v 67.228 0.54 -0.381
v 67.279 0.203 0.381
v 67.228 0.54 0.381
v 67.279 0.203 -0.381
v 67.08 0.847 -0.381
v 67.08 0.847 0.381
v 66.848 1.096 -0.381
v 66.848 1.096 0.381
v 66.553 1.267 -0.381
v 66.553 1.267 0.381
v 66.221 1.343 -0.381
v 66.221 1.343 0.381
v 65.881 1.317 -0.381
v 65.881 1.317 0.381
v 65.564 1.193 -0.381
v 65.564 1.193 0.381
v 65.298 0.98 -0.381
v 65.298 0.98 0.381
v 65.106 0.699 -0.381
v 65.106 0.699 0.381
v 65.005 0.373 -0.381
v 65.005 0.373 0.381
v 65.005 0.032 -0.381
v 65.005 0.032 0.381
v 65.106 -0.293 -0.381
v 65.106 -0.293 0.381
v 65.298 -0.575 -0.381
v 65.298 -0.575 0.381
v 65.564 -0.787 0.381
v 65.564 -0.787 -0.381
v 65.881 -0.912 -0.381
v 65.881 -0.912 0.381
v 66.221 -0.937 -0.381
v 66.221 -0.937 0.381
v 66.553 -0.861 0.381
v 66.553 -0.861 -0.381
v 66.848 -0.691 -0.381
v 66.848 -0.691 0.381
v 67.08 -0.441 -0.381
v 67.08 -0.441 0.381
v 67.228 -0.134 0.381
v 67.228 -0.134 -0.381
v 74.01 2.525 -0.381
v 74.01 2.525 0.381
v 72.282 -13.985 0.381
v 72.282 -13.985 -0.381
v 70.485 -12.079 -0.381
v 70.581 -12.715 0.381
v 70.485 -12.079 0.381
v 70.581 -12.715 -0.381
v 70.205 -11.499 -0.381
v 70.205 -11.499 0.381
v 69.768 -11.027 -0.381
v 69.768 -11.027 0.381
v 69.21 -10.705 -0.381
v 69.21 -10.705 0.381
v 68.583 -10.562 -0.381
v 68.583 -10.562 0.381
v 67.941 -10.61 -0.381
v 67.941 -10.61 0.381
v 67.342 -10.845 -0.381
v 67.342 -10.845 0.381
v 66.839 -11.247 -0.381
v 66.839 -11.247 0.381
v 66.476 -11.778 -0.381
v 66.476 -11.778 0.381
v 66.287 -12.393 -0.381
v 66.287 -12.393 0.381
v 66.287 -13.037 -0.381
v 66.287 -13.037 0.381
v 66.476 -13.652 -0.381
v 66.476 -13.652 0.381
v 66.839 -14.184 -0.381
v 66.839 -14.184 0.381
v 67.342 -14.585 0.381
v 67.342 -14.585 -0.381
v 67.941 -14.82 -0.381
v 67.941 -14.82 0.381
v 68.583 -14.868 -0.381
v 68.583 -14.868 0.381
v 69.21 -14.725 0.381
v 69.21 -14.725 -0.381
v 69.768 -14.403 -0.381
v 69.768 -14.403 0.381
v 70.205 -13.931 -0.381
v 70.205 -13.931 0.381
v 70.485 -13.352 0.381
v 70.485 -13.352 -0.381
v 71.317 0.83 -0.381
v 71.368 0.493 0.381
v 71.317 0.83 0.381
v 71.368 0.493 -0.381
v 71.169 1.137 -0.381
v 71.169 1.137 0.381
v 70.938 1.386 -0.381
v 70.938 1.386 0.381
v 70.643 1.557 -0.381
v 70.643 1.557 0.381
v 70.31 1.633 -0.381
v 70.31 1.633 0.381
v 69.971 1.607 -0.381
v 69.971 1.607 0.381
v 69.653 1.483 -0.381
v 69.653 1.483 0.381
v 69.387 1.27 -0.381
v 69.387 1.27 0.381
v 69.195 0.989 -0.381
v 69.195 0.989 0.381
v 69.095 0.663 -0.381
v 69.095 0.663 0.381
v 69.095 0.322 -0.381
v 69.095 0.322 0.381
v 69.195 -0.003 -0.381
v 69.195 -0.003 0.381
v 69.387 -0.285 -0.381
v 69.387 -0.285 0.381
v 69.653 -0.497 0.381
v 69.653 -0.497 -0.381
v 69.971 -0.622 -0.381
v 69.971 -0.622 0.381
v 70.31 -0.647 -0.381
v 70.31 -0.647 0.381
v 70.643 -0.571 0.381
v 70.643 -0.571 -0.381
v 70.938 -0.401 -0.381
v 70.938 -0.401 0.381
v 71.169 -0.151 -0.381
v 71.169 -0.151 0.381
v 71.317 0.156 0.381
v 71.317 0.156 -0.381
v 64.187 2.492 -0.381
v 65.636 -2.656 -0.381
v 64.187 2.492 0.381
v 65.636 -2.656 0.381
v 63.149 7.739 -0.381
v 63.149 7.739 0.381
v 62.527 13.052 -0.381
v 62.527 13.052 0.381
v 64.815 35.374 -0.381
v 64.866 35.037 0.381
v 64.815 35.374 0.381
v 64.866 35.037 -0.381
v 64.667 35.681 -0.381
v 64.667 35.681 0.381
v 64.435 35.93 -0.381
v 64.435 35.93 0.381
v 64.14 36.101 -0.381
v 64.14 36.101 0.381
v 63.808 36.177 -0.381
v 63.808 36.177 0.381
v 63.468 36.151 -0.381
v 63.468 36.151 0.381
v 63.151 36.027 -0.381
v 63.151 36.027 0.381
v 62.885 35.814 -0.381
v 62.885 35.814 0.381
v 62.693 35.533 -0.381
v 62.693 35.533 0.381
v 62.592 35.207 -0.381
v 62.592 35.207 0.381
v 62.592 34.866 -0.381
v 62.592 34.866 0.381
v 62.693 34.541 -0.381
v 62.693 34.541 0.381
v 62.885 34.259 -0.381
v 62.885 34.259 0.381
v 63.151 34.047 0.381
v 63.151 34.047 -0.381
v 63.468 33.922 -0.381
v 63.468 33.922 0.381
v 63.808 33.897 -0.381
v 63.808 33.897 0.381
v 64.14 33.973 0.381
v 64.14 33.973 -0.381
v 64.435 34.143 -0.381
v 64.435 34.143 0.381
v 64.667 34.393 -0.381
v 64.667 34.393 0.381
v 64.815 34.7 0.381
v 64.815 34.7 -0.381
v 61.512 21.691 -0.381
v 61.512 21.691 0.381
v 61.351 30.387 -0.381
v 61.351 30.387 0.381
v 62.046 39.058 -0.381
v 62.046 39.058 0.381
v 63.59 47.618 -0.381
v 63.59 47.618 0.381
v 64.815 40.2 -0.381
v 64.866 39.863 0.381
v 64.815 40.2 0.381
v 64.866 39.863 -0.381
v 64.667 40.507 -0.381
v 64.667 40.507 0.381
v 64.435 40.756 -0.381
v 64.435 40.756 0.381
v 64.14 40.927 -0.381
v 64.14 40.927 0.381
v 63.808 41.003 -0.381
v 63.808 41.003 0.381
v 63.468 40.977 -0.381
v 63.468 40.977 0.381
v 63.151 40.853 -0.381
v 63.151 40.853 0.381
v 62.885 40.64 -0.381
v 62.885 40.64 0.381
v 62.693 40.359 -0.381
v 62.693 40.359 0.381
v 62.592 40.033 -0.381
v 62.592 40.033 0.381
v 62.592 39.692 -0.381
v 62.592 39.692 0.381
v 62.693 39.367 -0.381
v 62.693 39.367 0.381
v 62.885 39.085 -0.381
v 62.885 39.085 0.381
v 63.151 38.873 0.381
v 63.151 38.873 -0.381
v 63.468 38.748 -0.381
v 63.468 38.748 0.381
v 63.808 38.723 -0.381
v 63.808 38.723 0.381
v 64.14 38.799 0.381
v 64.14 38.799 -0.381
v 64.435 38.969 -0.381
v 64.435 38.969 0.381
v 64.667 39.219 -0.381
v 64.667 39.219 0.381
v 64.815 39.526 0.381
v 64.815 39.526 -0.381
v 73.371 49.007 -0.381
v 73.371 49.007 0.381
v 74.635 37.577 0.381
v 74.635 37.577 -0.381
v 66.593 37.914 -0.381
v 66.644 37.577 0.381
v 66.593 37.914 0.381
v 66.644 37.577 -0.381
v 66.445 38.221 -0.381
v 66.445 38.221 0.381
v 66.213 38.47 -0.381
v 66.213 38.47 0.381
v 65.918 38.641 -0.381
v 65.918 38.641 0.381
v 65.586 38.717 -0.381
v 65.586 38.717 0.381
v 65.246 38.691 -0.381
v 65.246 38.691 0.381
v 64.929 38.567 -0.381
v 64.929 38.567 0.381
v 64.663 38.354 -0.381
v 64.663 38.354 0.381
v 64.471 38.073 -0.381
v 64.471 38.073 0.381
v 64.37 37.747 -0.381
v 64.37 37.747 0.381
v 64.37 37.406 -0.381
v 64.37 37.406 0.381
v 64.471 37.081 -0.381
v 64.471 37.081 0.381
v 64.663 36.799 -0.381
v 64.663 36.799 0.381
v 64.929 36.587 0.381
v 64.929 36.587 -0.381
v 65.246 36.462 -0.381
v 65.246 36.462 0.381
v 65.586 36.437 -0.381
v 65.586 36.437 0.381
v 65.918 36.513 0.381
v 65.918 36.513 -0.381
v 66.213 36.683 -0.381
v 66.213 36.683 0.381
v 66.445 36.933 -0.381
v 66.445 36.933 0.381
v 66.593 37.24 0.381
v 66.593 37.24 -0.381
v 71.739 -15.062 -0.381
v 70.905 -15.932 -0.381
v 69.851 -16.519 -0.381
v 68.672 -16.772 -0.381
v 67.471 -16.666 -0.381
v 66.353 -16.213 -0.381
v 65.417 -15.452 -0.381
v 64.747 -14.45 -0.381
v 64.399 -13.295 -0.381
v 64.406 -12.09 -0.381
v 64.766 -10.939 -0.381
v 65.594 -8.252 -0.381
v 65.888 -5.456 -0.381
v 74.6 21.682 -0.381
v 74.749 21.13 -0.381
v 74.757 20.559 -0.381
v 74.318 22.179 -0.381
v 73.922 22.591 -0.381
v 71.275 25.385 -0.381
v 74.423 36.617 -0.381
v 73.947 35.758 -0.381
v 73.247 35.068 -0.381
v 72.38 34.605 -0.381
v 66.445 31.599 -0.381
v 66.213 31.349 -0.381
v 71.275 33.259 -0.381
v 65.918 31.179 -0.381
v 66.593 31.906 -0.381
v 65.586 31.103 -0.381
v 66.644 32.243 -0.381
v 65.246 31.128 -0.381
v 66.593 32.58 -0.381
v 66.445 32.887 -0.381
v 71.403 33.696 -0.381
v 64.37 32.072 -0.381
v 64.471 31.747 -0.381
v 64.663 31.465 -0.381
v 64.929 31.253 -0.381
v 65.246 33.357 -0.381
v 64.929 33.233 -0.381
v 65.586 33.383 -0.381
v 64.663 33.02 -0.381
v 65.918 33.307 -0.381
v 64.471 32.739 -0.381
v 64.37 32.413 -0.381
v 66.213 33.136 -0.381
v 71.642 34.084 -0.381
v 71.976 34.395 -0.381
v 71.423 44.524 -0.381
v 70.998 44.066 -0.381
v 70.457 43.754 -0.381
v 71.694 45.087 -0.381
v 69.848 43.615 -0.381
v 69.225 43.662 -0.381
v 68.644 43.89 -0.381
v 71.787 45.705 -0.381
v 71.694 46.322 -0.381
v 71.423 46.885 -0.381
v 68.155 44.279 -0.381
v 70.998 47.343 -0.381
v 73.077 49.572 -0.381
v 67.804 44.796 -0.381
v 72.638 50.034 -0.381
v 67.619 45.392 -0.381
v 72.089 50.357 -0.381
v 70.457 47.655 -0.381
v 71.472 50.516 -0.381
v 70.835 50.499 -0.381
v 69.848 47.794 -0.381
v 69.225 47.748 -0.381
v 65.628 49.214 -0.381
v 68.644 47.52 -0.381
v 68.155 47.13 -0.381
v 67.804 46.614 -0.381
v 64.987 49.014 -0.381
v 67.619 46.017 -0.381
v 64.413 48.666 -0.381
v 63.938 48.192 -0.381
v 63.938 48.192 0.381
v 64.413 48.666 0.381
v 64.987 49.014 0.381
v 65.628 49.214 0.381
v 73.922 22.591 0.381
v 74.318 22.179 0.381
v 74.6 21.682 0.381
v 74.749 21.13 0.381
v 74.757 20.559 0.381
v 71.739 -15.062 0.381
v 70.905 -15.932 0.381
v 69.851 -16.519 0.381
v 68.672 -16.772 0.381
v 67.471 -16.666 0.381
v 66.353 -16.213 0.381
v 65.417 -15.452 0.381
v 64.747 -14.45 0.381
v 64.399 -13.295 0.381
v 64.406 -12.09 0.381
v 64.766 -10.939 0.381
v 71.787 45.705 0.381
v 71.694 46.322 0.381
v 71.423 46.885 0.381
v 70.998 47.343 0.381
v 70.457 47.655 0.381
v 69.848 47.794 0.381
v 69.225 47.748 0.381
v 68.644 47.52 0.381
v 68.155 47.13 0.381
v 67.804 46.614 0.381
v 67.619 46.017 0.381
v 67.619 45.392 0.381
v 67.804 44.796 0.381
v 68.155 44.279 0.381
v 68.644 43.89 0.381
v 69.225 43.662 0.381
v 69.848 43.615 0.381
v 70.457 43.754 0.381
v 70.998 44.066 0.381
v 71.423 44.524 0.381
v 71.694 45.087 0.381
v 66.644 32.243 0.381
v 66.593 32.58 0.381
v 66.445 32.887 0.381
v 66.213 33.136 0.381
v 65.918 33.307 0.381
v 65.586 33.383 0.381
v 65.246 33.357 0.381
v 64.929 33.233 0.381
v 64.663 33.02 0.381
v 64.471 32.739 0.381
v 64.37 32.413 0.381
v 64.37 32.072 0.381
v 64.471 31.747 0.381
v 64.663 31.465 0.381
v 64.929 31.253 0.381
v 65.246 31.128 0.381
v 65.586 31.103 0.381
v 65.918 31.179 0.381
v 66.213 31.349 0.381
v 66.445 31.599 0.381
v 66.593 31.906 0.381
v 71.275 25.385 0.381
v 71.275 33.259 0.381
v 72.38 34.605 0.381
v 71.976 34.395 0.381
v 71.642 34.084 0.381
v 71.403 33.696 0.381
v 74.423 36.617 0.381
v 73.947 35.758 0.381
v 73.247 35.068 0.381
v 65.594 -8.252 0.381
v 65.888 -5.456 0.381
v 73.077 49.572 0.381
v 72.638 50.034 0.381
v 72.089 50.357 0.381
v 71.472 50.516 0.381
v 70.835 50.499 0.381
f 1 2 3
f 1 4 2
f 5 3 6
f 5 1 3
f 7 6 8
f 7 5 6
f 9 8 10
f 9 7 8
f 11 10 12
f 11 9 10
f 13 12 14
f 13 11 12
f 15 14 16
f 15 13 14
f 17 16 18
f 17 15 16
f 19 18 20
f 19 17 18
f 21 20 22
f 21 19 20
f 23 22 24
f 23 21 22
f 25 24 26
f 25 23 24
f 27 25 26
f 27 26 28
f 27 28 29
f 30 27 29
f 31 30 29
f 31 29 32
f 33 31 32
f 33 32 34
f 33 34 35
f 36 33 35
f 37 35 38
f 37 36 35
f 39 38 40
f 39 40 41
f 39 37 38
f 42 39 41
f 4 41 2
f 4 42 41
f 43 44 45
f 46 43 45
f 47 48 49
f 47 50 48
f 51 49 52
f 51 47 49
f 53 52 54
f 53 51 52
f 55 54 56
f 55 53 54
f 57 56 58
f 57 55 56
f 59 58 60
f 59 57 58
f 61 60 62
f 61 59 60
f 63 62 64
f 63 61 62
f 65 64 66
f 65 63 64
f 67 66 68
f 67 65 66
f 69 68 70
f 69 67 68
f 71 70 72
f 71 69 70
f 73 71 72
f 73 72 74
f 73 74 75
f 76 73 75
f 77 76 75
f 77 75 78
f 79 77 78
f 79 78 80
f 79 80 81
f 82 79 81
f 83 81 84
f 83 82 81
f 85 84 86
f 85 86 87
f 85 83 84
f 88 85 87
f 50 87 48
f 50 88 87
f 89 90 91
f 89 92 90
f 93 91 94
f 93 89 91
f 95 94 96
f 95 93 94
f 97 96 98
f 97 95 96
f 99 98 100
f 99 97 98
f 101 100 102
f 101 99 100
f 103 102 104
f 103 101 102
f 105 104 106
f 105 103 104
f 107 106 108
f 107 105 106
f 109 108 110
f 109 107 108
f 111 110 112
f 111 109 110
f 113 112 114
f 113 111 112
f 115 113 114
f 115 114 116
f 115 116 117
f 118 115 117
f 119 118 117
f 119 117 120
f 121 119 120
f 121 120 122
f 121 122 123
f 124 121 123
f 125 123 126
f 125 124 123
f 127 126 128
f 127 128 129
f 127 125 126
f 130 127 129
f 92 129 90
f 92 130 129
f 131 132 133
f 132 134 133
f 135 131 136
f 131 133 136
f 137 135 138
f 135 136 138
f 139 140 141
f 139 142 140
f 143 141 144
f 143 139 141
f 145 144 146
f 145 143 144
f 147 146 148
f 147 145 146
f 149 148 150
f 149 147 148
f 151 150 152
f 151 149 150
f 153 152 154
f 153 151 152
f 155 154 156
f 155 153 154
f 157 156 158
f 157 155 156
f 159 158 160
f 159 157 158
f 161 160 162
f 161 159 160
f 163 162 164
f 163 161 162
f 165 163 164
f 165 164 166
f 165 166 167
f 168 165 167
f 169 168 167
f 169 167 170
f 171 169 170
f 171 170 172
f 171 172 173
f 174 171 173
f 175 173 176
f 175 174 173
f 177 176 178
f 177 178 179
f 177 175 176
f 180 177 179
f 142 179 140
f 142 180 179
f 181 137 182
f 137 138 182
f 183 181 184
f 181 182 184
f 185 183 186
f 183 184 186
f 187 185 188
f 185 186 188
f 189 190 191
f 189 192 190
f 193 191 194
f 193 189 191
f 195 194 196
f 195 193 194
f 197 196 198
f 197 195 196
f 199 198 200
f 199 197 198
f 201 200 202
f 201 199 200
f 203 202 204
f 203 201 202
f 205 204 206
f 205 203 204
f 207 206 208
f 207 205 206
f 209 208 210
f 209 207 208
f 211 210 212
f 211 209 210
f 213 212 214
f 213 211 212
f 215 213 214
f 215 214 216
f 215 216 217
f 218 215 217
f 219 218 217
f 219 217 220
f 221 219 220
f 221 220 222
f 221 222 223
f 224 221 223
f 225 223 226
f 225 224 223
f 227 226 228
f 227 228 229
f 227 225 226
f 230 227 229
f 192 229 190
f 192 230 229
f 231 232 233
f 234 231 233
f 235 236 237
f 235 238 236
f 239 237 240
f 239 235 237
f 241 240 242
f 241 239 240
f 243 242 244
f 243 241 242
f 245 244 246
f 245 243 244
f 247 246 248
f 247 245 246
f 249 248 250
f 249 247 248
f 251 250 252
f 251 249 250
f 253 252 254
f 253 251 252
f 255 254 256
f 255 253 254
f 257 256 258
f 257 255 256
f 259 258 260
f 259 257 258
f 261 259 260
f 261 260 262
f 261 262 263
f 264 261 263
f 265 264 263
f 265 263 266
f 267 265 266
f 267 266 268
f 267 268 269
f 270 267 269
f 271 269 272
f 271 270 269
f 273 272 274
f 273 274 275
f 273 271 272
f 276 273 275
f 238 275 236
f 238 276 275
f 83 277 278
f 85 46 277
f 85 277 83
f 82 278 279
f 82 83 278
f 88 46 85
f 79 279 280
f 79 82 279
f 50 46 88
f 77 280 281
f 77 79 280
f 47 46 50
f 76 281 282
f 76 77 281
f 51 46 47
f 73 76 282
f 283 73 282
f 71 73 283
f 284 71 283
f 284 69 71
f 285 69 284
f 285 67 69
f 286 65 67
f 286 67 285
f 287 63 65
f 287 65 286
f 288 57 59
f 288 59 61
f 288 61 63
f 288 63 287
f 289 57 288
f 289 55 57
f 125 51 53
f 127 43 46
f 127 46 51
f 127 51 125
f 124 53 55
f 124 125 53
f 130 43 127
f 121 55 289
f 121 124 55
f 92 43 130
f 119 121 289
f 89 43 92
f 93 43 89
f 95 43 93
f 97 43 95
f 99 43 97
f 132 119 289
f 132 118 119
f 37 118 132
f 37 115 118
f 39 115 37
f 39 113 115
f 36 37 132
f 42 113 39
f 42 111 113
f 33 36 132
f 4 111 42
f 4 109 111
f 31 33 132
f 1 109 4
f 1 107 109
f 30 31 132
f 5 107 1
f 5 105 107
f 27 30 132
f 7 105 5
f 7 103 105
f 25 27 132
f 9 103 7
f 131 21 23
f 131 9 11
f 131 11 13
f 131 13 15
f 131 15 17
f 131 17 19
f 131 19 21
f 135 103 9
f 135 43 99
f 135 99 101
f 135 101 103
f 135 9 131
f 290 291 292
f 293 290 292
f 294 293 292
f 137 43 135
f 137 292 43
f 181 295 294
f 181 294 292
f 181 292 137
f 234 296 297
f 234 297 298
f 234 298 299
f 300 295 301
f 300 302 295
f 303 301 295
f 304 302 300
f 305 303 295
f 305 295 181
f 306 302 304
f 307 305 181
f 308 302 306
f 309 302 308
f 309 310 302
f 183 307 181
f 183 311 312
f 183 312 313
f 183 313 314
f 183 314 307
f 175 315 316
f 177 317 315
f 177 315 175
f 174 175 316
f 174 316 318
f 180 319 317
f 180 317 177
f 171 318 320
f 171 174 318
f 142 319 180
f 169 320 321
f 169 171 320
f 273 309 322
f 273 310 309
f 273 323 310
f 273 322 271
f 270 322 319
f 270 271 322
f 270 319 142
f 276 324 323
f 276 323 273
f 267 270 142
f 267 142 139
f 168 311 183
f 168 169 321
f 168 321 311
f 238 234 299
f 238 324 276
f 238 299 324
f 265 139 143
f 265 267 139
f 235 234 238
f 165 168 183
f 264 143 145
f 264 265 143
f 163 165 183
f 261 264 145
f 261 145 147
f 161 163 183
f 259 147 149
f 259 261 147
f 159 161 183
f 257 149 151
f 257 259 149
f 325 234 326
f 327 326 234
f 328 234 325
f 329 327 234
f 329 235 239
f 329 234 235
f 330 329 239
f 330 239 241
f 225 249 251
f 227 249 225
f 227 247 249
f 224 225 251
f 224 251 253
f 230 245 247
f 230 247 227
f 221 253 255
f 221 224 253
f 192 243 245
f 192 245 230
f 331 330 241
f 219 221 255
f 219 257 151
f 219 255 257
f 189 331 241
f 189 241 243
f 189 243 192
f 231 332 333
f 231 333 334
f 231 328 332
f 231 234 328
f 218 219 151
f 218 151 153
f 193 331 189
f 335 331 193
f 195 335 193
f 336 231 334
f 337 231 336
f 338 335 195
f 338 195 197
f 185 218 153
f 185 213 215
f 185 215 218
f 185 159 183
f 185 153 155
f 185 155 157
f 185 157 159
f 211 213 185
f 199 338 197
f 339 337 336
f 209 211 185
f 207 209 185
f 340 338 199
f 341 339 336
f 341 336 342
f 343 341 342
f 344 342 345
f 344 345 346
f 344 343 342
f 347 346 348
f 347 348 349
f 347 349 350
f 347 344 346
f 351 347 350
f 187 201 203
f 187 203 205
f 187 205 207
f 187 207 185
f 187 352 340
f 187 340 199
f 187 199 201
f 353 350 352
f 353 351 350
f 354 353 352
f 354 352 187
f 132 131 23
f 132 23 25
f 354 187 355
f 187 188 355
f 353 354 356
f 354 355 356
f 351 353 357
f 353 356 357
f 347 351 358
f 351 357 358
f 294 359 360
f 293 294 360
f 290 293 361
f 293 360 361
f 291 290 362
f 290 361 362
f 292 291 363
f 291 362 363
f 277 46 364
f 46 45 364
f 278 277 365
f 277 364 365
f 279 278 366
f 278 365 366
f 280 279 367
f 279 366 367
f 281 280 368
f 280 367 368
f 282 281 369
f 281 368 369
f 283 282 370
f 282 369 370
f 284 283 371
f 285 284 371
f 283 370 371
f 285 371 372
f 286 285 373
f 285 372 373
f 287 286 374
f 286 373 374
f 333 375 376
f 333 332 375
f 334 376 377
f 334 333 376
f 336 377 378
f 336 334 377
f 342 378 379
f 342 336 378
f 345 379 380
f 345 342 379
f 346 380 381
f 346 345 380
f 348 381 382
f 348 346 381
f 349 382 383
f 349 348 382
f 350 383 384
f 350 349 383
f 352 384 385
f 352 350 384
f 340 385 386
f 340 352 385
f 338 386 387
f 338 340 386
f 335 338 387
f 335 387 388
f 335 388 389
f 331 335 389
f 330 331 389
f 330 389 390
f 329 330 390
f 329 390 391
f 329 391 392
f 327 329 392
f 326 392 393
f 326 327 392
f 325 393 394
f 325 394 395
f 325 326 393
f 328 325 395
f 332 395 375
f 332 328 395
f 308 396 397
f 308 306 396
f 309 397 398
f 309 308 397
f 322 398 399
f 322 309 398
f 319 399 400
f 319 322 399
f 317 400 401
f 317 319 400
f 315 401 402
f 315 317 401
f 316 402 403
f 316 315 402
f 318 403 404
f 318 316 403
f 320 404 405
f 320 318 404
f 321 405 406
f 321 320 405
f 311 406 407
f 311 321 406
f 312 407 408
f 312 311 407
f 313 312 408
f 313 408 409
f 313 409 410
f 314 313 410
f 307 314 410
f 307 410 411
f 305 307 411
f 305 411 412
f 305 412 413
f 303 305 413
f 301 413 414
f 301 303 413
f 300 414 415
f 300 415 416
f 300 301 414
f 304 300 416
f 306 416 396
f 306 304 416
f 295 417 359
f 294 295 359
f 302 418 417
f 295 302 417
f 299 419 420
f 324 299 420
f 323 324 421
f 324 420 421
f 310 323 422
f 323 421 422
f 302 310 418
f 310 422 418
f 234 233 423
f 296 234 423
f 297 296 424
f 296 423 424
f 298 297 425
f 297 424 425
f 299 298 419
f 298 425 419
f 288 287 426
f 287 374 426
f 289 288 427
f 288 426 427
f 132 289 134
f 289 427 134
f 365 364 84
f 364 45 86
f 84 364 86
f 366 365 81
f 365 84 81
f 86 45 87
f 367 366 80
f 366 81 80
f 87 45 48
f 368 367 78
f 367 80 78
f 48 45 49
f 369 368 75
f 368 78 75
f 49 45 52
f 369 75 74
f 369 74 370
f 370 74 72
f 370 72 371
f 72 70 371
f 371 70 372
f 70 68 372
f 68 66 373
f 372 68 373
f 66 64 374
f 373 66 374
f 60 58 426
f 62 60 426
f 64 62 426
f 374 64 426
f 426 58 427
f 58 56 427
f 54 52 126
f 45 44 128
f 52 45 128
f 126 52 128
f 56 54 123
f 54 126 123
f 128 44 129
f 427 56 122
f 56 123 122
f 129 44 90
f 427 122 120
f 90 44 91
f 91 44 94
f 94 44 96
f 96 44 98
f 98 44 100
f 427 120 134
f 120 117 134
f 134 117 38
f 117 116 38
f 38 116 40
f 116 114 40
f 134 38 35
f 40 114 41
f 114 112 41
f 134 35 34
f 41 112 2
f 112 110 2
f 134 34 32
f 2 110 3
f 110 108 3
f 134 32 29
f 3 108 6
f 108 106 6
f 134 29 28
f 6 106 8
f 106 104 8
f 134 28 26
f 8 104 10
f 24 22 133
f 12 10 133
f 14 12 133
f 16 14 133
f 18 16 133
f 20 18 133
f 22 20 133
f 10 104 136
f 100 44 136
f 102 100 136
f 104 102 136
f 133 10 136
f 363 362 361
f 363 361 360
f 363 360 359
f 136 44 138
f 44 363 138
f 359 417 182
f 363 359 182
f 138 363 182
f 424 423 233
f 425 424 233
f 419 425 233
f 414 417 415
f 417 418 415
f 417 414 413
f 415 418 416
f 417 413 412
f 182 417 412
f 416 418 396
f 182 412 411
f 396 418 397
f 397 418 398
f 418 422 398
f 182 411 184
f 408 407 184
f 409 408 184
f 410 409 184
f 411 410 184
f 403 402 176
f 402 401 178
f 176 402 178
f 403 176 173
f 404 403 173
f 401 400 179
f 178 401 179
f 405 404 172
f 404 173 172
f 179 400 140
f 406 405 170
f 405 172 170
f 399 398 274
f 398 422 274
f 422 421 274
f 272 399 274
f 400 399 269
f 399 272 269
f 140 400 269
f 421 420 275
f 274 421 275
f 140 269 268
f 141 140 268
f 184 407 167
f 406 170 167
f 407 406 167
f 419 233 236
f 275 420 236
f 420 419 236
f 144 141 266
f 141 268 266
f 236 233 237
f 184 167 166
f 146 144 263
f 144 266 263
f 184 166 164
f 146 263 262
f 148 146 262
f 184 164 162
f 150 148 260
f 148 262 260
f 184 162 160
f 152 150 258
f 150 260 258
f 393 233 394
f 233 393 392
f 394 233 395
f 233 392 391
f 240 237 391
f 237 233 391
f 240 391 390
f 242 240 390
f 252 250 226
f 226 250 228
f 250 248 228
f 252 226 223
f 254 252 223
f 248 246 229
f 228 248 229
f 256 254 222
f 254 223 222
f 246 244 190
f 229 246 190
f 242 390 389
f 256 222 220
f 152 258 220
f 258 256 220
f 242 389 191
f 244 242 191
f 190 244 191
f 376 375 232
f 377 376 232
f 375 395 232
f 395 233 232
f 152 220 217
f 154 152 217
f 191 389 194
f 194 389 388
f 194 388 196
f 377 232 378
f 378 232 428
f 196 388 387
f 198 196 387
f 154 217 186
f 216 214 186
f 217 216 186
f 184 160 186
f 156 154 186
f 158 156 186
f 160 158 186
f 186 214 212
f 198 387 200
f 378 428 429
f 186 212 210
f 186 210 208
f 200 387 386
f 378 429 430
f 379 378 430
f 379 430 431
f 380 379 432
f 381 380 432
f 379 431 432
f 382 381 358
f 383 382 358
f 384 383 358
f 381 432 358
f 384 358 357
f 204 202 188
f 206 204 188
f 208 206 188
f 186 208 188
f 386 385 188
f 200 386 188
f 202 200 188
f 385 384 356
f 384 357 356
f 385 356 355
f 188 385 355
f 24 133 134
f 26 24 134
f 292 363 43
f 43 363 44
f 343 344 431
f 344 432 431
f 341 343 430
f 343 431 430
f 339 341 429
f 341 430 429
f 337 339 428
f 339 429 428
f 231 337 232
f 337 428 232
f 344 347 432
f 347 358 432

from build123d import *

# Parameters (mm, degrees)
SKETCH1_R           = 2.159
SKETCH1_R_2         = 1.143
SKETCH1_R_3         = 2.0955
BOSS_EXTRUDE1_DEPTH = 0.381


with BuildPart() as part:
    # Sketch1 → Boss-Extrude1 (new body, symmetric)
    with BuildSketch(Plane.XY):
        with BuildLine():
            Line((74.009533162, 2.524763773), (72.281998937, -13.985236227))
            ThreePointArc((72.281998937, -13.985236227), (66.894838719, -16.481573981), (64.766369935, -10.938757185))
            ThreePointArc((64.766369935, -10.938757185), (65.80913713, -6.8614285), (65.635785401, -2.656440771))
            ThreePointArc((65.635785401, -2.656440771), (63.616027596, 5.10567878), (62.526786778, 13.051965708))
            ThreePointArc((62.526786778, 13.051965708), (61.351286871, 30.387313841), (63.589596905, 47.617695819))
            ThreePointArc((63.589596905, 47.617695819), (64.412502938, 48.666218898), (65.627533162, 49.214193845))
            Line((65.627533162, 49.214193845), (70.834533162, 50.498790171))
            ThreePointArc((70.834533162, 50.498790171), (72.374643438, 50.21510876), (73.370794631, 49.006763773))
            Line((73.370794631, 49.006763773), (74.635112814, 37.576763773))
            ThreePointArc((74.635112814, 37.576763773), (73.946841775, 35.757603322), (72.379792613, 34.605466744))
            ThreePointArc((72.379792613, 34.605466744), (71.641962058, 34.084204846), (71.274872248, 33.258763773))
            Line((71.274872248, 33.258763773), (71.274872248, 25.384763773))
            Line((71.274872248, 25.384763773), (73.922374141, 22.590763773))
            ThreePointArc((73.922374141, 22.590763773), (74.599970213, 21.681643486), (74.757378227, 20.558763773))
            Line((74.757378227, 20.558763773), (74.009533162, 2.524763773))
        make_face()
        with Locations((68.421533162, -12.715236227)):
            Circle(SKETCH1_R, mode=Mode.SUBTRACT)
        with Locations((70.224933162, 0.492763773)):
            Circle(SKETCH1_R_2, mode=Mode.SUBTRACT)
        with Locations((66.135533162, 0.202809344)):
            Circle(SKETCH1_R_2, mode=Mode.SUBTRACT)
        with Locations((65.500533162, 32.242763773)):
            Circle(SKETCH1_R_2, mode=Mode.SUBTRACT)
        with Locations((65.500533162, 37.576763773)):
            Circle(SKETCH1_R_2, mode=Mode.SUBTRACT)
        with Locations((69.691533162, 45.704763773)):
            Circle(SKETCH1_R_3, mode=Mode.SUBTRACT)
        with Locations((63.722533162, 39.862763773)):
            Circle(SKETCH1_R_2, mode=Mode.SUBTRACT)
        with Locations((63.722533162, 35.036763773)):
            Circle(SKETCH1_R_2, mode=Mode.SUBTRACT)
    extrude(amount=BOSS_EXTRUDE1_DEPTH, both=True)


solid = part.part
